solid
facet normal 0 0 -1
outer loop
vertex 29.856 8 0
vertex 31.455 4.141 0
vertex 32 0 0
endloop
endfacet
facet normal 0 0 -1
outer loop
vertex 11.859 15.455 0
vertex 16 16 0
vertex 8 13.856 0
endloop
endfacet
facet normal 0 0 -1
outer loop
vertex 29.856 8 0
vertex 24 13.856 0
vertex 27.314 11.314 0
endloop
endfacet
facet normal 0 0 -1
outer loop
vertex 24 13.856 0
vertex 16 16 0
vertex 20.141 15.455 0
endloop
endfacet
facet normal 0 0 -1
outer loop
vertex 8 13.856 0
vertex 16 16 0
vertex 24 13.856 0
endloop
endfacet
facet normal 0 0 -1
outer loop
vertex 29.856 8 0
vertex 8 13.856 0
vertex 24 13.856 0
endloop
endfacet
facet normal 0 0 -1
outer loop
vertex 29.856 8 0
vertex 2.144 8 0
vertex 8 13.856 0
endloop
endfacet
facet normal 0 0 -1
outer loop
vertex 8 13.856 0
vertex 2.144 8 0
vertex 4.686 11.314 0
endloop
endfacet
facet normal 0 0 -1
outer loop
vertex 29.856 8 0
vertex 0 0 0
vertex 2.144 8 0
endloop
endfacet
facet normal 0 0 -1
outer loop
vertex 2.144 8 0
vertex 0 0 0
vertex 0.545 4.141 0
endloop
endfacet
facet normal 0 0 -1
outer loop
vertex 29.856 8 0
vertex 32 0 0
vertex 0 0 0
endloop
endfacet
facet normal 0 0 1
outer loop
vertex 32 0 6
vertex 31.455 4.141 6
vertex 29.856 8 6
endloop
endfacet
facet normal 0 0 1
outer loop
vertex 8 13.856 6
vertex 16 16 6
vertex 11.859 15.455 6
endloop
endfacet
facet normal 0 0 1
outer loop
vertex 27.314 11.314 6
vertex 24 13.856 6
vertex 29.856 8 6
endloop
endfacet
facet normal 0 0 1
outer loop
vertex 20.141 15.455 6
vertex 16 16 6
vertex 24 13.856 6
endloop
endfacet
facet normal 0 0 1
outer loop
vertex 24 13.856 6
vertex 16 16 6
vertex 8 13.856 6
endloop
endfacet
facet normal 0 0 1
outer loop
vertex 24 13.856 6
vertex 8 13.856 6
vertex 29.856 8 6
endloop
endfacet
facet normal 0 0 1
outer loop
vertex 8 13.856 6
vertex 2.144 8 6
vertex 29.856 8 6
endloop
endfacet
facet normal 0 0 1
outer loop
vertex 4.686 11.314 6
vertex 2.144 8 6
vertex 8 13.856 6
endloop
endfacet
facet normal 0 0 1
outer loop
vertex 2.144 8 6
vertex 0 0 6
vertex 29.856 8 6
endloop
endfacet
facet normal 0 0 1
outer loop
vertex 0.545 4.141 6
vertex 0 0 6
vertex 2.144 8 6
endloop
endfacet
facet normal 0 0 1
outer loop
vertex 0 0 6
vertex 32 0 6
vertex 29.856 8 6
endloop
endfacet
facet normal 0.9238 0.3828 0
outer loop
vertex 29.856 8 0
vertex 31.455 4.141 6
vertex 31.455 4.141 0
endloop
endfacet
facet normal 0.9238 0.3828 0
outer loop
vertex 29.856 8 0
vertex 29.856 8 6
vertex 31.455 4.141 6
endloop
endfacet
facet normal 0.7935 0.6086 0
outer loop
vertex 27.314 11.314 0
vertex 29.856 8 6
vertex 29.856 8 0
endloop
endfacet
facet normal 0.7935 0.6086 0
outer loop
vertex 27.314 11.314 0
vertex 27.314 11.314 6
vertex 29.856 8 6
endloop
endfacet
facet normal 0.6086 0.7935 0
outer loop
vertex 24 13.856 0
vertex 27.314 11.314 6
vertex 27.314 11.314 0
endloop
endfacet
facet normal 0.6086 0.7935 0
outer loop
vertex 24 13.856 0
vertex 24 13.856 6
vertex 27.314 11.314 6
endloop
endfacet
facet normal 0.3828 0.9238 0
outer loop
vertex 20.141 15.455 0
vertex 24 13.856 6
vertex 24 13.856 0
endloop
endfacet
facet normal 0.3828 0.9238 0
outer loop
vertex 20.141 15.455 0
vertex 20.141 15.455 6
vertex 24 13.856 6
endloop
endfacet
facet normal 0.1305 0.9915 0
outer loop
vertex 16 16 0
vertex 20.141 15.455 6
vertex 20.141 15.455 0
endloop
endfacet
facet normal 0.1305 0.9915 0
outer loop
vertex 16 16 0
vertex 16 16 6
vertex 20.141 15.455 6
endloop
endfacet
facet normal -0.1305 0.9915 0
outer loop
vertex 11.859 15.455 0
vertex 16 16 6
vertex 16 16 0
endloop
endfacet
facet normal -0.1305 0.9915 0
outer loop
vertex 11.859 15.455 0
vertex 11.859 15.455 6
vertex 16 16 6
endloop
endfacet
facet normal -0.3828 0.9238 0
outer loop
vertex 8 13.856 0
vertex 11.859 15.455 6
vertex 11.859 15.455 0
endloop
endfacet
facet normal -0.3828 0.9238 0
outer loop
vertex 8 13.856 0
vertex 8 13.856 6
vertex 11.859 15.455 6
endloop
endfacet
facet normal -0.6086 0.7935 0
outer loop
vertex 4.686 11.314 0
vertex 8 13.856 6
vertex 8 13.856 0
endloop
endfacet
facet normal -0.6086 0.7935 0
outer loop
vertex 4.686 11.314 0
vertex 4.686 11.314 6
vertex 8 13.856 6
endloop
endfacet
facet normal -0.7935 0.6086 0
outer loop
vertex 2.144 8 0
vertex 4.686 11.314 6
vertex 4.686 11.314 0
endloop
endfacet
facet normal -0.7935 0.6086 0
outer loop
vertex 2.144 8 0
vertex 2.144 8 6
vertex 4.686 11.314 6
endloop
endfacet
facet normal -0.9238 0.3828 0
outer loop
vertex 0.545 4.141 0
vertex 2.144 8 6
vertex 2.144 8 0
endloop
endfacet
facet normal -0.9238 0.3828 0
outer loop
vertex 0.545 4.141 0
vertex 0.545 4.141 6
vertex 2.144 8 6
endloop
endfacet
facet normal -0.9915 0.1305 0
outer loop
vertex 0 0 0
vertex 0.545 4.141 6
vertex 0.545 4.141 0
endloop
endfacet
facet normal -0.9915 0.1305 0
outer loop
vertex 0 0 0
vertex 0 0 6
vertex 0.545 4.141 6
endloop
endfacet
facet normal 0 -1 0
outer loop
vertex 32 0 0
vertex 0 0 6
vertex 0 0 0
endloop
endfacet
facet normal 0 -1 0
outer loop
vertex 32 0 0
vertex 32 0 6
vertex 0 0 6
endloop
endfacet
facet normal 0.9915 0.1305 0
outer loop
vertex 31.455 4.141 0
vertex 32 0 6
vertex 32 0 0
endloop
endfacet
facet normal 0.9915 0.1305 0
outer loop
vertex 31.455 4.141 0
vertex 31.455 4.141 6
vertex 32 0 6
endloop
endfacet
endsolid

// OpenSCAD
$fn = 32;

// ----------------------------------------------------------------------
// Key bar: woodruff key, 6 mm thick
// ----------------------------------------------------------------------

// --- parameters (mm) ---
profile_height = 6;       // extrusion height
profile_points = 13;      // points of the closed outline

profile = [[32, 0], [31.455, 4.141], [29.856, 8], [27.314, 11.314], [24, 13.856], [20.141, 15.455], [16, 16], [11.859, 15.455], [8, 13.856], [4.686, 11.314], [2.144, 8], [0.545, 4.141], [0, 0]];  // single closed polygon, 13 points, counter clockwise

// --- the one profile operation ---
linear_extrude(height = profile_height) polygon(points = profile);
